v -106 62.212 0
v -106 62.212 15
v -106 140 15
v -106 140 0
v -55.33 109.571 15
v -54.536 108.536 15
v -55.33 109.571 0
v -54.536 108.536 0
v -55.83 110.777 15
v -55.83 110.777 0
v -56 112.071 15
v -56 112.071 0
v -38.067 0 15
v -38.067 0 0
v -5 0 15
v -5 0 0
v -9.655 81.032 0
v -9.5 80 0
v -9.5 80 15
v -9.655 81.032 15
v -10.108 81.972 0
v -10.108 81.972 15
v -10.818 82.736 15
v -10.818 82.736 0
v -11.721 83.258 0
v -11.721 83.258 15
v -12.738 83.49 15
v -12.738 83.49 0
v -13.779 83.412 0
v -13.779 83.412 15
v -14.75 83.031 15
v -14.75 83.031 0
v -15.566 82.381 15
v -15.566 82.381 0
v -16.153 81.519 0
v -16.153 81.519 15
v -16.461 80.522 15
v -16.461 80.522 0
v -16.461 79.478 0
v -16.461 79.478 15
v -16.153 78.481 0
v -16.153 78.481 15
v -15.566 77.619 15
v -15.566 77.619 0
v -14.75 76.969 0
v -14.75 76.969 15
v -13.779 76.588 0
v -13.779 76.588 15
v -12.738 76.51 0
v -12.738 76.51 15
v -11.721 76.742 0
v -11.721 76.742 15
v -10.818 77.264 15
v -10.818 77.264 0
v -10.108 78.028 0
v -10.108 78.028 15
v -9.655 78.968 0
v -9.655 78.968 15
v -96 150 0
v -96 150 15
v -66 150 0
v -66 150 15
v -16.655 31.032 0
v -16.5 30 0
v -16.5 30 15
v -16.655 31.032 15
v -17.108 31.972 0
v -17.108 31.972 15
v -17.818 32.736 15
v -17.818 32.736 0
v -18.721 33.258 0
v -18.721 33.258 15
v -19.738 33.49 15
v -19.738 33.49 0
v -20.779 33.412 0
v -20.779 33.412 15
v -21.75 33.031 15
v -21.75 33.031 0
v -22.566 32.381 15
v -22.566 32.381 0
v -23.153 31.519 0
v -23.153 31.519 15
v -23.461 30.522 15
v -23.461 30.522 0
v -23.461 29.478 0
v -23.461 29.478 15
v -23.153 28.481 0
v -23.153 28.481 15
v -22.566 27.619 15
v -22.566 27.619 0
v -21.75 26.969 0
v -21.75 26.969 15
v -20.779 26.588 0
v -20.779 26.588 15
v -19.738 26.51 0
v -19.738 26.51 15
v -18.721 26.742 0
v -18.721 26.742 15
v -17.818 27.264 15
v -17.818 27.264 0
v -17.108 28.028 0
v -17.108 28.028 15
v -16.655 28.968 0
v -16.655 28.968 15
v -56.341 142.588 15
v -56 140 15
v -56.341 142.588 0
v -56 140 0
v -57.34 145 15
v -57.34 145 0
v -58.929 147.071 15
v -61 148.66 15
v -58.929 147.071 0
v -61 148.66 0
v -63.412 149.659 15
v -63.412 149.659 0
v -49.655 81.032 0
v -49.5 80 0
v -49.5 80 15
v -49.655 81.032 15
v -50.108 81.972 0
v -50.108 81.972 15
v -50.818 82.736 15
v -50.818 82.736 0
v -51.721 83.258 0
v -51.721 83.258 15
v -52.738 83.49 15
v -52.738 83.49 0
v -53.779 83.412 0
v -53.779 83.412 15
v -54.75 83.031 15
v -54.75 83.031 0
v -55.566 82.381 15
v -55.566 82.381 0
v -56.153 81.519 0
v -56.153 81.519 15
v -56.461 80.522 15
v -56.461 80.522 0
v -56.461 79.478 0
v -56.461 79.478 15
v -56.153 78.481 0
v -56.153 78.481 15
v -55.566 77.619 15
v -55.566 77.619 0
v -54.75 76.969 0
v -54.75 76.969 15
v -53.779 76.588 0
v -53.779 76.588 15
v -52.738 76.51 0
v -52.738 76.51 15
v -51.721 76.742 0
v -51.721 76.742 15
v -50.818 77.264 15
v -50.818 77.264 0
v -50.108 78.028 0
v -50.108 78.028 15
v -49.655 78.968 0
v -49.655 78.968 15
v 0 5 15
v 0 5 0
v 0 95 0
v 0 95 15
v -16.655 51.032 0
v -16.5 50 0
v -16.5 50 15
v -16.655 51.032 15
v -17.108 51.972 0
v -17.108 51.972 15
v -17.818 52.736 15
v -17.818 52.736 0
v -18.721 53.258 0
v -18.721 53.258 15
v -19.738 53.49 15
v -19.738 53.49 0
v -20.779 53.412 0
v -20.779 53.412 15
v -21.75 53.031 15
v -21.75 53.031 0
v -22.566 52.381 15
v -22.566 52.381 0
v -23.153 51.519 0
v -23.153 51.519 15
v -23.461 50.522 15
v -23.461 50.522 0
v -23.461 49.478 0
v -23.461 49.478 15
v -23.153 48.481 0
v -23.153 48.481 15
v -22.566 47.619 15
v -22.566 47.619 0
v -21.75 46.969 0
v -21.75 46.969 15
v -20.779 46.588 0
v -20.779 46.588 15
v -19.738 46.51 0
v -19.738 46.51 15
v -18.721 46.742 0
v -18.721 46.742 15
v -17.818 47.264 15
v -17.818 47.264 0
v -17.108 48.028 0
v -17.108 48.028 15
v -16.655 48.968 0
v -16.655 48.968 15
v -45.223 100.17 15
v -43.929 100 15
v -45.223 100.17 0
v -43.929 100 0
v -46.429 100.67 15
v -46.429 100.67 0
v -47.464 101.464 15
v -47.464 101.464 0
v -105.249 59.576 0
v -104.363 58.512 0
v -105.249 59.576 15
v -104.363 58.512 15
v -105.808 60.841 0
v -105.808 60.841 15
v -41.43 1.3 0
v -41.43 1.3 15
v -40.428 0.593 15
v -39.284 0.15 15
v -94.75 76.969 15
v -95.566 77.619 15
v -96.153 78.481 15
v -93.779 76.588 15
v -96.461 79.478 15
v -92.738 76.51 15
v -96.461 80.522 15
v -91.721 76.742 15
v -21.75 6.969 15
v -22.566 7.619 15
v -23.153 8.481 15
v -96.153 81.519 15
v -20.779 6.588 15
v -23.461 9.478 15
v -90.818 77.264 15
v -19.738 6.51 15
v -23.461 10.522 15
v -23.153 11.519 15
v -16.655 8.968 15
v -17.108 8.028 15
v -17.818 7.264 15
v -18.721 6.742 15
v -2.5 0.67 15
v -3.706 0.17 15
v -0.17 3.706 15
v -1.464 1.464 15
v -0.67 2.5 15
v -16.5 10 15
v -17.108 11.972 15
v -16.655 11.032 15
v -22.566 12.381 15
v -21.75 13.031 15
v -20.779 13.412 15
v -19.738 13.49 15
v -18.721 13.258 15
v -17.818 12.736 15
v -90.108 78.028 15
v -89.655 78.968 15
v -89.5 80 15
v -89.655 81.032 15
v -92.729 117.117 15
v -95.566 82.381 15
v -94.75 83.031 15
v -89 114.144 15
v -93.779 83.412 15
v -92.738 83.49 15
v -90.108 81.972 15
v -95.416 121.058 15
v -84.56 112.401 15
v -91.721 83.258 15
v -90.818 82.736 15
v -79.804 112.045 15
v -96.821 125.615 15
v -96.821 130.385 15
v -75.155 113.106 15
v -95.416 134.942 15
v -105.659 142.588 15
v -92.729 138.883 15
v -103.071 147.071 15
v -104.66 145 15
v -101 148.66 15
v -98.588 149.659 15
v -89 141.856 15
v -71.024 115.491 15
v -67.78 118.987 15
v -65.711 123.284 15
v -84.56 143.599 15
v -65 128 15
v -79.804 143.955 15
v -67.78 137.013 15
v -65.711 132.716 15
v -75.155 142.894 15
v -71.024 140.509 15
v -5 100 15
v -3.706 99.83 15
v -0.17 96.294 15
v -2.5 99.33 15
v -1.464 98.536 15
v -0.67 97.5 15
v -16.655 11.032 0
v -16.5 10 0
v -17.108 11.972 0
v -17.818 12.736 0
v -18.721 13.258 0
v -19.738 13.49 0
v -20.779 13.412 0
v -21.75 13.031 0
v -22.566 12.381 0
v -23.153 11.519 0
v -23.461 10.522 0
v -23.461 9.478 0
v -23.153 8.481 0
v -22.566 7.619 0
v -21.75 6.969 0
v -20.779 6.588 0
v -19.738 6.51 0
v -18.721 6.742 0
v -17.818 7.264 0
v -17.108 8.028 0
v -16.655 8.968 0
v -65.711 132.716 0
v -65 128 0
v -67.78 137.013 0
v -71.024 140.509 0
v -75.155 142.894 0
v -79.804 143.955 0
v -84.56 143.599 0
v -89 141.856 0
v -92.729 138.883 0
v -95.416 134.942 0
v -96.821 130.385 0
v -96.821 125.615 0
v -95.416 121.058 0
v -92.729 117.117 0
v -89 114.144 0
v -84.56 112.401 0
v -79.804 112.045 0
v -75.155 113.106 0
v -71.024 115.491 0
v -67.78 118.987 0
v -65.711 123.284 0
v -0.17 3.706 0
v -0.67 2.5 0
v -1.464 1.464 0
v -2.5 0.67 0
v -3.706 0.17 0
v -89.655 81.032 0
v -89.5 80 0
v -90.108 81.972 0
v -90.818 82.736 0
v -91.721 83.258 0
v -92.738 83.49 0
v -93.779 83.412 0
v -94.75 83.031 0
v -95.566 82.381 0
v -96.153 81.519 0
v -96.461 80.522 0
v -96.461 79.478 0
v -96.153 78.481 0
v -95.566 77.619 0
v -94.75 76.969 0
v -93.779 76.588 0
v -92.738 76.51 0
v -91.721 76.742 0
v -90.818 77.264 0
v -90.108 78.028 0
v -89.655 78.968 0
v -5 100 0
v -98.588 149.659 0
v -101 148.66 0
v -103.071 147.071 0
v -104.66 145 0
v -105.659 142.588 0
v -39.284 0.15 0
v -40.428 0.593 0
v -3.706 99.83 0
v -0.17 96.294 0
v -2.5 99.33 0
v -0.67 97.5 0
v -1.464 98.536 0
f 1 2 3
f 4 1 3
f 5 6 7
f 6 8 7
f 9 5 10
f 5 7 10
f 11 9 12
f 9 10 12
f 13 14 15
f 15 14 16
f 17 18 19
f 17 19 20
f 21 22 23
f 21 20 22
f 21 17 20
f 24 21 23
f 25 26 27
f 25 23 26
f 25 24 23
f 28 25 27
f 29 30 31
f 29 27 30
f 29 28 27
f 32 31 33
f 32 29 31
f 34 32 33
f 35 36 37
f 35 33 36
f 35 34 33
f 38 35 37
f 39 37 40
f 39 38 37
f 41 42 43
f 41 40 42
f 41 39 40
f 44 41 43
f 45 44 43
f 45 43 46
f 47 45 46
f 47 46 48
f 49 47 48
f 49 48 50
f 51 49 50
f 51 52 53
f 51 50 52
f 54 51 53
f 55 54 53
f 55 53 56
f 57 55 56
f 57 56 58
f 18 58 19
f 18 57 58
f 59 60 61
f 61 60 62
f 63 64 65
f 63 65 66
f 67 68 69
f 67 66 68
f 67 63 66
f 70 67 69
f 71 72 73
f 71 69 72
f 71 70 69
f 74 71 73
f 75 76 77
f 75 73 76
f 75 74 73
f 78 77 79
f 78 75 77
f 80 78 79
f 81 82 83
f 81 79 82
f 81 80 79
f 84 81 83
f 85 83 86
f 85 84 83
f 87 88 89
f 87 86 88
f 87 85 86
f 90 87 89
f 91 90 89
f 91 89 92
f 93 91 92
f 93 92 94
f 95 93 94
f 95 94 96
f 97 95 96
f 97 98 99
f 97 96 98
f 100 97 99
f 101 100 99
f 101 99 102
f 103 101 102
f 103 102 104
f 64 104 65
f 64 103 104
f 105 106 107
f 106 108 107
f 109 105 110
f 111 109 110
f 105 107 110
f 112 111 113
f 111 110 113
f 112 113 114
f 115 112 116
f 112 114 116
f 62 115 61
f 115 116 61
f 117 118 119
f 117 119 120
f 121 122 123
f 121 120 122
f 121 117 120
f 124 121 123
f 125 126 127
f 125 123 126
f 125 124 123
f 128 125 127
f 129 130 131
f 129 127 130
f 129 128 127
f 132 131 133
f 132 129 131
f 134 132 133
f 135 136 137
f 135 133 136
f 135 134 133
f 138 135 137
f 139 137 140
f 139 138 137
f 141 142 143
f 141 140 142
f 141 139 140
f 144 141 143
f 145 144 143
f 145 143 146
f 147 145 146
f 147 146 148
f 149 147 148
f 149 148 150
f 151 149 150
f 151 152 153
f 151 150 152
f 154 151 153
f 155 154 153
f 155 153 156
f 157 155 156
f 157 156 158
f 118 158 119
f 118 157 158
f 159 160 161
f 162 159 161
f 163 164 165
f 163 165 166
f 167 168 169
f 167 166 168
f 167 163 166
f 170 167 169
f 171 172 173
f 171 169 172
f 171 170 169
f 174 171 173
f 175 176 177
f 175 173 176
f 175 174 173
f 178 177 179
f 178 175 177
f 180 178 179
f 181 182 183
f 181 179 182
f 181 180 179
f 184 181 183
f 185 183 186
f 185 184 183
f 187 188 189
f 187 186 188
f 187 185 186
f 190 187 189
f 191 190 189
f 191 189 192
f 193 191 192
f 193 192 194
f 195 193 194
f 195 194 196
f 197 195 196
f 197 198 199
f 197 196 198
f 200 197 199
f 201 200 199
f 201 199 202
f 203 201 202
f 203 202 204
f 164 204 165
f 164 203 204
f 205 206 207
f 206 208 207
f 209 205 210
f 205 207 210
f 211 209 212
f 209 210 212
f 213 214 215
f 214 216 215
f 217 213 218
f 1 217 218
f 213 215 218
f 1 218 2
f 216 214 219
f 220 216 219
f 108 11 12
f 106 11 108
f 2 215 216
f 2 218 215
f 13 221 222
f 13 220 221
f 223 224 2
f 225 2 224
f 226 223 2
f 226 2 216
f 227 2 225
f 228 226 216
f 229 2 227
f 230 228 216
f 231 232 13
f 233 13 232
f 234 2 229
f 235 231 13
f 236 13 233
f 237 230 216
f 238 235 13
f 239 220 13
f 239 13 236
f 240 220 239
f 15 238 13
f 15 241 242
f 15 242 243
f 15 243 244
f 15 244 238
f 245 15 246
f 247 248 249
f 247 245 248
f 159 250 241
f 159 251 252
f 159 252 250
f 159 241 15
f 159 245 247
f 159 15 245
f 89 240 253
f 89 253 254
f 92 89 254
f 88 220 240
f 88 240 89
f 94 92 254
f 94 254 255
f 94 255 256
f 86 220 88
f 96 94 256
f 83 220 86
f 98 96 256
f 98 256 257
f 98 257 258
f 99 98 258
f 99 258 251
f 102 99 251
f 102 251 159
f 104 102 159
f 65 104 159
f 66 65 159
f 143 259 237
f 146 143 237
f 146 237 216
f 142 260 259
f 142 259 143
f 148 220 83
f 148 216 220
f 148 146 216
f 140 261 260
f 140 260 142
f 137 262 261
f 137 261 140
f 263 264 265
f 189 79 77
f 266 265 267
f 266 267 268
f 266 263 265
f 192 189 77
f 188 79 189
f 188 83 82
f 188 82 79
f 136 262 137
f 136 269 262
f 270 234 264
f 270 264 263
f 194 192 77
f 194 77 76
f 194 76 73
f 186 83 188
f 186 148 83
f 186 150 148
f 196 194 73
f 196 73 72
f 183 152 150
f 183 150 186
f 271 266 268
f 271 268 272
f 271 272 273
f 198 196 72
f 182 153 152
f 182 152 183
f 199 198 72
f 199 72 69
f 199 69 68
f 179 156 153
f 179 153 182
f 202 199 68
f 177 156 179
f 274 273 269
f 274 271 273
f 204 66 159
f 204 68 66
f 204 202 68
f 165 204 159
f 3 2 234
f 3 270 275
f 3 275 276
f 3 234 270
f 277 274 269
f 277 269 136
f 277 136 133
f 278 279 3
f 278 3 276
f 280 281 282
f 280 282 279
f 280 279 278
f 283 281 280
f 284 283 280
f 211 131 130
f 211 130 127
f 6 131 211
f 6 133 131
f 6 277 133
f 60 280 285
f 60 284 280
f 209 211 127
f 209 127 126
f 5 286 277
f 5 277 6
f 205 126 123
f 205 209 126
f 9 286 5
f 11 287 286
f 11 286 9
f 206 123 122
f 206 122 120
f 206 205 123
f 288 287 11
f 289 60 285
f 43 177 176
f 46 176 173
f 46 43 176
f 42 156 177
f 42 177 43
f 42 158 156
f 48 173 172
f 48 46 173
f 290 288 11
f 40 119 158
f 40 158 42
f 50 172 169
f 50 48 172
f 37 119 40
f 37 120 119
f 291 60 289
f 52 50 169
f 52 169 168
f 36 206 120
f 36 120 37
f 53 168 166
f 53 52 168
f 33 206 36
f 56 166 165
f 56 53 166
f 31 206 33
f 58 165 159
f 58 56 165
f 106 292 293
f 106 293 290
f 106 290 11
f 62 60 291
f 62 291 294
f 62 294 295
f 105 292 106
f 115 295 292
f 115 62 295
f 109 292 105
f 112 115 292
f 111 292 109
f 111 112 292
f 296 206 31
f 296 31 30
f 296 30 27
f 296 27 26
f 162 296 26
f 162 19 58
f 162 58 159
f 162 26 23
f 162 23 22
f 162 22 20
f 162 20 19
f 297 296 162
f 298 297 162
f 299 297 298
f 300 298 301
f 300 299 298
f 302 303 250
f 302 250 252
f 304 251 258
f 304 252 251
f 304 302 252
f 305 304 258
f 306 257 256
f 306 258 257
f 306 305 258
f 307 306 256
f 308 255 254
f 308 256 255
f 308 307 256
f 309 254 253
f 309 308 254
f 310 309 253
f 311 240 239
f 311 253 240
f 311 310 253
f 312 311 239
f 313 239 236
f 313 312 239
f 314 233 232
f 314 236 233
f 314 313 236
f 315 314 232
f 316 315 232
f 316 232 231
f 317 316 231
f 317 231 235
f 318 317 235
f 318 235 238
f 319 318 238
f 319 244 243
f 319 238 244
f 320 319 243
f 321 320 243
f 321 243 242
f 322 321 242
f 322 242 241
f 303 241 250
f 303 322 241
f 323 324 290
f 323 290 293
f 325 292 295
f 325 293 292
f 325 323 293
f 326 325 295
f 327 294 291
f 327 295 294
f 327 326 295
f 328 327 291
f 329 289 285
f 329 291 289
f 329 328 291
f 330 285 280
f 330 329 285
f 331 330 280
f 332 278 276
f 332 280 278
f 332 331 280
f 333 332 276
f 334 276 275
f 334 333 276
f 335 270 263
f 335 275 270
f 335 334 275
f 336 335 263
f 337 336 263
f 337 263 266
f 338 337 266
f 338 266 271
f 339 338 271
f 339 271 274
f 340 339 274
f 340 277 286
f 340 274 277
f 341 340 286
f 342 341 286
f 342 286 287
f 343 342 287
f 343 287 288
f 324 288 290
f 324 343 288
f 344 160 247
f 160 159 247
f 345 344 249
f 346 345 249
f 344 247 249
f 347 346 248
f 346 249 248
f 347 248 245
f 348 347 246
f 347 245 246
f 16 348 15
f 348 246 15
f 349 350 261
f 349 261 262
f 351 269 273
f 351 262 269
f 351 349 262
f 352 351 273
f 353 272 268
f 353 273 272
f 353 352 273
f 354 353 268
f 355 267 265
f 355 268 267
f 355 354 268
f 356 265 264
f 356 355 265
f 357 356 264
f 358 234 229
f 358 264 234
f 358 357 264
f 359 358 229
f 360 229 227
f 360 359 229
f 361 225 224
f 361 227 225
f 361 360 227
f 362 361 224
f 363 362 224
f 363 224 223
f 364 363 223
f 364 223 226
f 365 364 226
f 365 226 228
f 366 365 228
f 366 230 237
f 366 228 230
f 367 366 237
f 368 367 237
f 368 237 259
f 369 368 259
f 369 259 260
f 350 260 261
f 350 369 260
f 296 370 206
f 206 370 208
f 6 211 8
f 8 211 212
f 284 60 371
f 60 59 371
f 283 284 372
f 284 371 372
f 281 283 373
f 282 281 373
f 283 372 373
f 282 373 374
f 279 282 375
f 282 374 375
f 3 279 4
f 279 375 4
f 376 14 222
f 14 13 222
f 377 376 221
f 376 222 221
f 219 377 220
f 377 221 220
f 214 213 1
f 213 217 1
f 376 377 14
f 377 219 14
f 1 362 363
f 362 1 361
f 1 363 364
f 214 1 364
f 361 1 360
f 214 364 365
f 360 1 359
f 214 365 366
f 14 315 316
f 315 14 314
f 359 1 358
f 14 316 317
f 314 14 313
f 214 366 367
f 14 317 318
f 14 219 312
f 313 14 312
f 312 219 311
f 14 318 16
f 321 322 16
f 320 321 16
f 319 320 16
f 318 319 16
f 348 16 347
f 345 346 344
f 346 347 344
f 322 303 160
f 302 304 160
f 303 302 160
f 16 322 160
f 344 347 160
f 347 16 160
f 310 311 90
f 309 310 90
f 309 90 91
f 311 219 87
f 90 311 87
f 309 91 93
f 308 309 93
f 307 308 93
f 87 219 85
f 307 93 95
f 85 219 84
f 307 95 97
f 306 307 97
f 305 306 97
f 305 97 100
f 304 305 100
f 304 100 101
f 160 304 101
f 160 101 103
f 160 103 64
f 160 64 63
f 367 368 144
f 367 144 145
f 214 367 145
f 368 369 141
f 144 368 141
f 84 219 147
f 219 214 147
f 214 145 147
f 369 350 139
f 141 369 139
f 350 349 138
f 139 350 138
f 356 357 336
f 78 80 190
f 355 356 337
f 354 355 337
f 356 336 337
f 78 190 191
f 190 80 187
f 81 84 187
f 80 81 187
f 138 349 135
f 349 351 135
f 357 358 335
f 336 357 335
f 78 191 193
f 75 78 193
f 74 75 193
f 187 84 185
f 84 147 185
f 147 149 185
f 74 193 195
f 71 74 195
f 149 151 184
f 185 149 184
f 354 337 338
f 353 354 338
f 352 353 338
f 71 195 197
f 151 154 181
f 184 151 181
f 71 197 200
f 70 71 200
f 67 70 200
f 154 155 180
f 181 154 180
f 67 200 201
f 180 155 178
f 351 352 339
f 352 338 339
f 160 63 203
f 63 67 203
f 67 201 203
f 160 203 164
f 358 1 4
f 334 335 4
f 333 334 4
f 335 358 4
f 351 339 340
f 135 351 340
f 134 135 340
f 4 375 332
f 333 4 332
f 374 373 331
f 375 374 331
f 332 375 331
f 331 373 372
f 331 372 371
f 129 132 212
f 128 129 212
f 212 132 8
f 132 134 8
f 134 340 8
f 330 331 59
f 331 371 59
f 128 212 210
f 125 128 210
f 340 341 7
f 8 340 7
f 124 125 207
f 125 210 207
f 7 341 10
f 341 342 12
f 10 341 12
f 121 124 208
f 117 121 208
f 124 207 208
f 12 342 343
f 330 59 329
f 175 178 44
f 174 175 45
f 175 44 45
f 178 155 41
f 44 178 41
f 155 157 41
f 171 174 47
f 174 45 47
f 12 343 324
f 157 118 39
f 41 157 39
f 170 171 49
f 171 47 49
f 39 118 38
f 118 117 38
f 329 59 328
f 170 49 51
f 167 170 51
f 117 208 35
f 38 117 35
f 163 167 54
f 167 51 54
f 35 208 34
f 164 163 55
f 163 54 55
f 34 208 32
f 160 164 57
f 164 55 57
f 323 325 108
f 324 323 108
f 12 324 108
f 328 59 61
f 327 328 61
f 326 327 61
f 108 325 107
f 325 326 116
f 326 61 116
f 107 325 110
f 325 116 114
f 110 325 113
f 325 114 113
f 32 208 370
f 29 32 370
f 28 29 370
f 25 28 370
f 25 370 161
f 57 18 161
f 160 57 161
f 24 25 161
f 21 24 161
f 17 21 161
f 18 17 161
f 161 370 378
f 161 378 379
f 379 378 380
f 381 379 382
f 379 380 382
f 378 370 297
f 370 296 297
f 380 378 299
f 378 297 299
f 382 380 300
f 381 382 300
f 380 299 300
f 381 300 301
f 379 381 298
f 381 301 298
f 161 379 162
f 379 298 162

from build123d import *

# Parameters (mm, degrees)
BOSS_EXTRU_1_DEPTH           = 15
ENL_V_MAT_EXTRU_1_DEPTH      = 147.495733726
ENL_V_MAT_EXTRU_1_DEPTH_BACK = 147.495733726
ESQUISSE2_R                  = 3.5
ESQUISSE3_W                  = 50
ESQUISSE3_H                  = 50
BOSS_EXTRU_2_DEPTH           = 15
CHANFREIN1_SIZE              = 10
ENL_V_MAT_EXTRU_2_DEPTH      = 185.285105204
ENL_V_MAT_EXTRU_2_DEPTH_BACK = 185.285105204
ESQUISSE4_R                  = 16
CONG_2_R                     = 5
CONG_3_R                     = 10


with BuildPart() as part:
    # Esquisse1 → Boss.-Extru.1 (new body)
    with BuildSketch(Plane.XY):
        Polygon((0, 0), (0, 100), (-106, 100), (-106, 60), (-40, 0), align=None)
    extrude(amount=BOSS_EXTRU_1_DEPTH)

    # Esquisse2 → Enlèv. mat.-Extru.1 (cut, two sides: drawn at the far end of the back side and taken through both)
    with BuildSketch(Plane.XY.offset(15).offset(-ENL_V_MAT_EXTRU_1_DEPTH_BACK)):
        with Locations((-20, 10)):
            Circle(ESQUISSE2_R)
        with Locations((-20, 30)):
            Circle(ESQUISSE2_R)
        with Locations((-20, 50)):
            Circle(ESQUISSE2_R)
        with Locations((-53, 80)):
            Circle(ESQUISSE2_R)
        with Locations((-93, 80)):
            Circle(ESQUISSE2_R)
        with Locations((-13, 80)):
            Circle(ESQUISSE2_R)
    extrude(amount=ENL_V_MAT_EXTRU_1_DEPTH + ENL_V_MAT_EXTRU_1_DEPTH_BACK, mode=Mode.SUBTRACT)

    # Esquisse3 → Boss.-Extru.2 (add)
    with BuildSketch(Plane.XY.offset(15)):
        with Locations((-81, 125)):
            Rectangle(ESQUISSE3_W, ESQUISSE3_H)
    extrude(amount=-BOSS_EXTRU_2_DEPTH)

    # Chanfrein1
    chanfrein1_edges = [part.edges().sort_by_distance(p)[0] for p in [
        (-56, 100, 7.5),
    ]]
    chamfer(chanfrein1_edges, length=CHANFREIN1_SIZE)

    # Esquisse4 → Enlèv. mat.-Extru.2 (cut, two sides: drawn at the far end of the back side and taken through both)
    with BuildSketch(Plane.XY.offset(15).offset(-ENL_V_MAT_EXTRU_2_DEPTH_BACK)):
        with Locations((-81, 128)):
            Circle(ESQUISSE4_R)
    extrude(amount=ENL_V_MAT_EXTRU_2_DEPTH + ENL_V_MAT_EXTRU_2_DEPTH_BACK, mode=Mode.SUBTRACT)

    # Congé2
    cong_2_edges = [part.edges().sort_by_distance(p)[0] for p in [
        (-46, 100, 7.5),
        (-56, 110, 7.5),
        (-40, 0, 7.5),
        (-106, 60, 7.5),
        (0, 100, 7.5),
        (0, 0, 7.5),
    ]]
    fillet(cong_2_edges, radius=CONG_2_R)

    # Congé3
    cong_3_edges = [part.edges().sort_by_distance(p)[0] for p in [
        (-106, 150, 7.5),
        (-56, 150, 7.5),
    ]]
    fillet(cong_3_edges, radius=CONG_3_R)


solid = part.part
